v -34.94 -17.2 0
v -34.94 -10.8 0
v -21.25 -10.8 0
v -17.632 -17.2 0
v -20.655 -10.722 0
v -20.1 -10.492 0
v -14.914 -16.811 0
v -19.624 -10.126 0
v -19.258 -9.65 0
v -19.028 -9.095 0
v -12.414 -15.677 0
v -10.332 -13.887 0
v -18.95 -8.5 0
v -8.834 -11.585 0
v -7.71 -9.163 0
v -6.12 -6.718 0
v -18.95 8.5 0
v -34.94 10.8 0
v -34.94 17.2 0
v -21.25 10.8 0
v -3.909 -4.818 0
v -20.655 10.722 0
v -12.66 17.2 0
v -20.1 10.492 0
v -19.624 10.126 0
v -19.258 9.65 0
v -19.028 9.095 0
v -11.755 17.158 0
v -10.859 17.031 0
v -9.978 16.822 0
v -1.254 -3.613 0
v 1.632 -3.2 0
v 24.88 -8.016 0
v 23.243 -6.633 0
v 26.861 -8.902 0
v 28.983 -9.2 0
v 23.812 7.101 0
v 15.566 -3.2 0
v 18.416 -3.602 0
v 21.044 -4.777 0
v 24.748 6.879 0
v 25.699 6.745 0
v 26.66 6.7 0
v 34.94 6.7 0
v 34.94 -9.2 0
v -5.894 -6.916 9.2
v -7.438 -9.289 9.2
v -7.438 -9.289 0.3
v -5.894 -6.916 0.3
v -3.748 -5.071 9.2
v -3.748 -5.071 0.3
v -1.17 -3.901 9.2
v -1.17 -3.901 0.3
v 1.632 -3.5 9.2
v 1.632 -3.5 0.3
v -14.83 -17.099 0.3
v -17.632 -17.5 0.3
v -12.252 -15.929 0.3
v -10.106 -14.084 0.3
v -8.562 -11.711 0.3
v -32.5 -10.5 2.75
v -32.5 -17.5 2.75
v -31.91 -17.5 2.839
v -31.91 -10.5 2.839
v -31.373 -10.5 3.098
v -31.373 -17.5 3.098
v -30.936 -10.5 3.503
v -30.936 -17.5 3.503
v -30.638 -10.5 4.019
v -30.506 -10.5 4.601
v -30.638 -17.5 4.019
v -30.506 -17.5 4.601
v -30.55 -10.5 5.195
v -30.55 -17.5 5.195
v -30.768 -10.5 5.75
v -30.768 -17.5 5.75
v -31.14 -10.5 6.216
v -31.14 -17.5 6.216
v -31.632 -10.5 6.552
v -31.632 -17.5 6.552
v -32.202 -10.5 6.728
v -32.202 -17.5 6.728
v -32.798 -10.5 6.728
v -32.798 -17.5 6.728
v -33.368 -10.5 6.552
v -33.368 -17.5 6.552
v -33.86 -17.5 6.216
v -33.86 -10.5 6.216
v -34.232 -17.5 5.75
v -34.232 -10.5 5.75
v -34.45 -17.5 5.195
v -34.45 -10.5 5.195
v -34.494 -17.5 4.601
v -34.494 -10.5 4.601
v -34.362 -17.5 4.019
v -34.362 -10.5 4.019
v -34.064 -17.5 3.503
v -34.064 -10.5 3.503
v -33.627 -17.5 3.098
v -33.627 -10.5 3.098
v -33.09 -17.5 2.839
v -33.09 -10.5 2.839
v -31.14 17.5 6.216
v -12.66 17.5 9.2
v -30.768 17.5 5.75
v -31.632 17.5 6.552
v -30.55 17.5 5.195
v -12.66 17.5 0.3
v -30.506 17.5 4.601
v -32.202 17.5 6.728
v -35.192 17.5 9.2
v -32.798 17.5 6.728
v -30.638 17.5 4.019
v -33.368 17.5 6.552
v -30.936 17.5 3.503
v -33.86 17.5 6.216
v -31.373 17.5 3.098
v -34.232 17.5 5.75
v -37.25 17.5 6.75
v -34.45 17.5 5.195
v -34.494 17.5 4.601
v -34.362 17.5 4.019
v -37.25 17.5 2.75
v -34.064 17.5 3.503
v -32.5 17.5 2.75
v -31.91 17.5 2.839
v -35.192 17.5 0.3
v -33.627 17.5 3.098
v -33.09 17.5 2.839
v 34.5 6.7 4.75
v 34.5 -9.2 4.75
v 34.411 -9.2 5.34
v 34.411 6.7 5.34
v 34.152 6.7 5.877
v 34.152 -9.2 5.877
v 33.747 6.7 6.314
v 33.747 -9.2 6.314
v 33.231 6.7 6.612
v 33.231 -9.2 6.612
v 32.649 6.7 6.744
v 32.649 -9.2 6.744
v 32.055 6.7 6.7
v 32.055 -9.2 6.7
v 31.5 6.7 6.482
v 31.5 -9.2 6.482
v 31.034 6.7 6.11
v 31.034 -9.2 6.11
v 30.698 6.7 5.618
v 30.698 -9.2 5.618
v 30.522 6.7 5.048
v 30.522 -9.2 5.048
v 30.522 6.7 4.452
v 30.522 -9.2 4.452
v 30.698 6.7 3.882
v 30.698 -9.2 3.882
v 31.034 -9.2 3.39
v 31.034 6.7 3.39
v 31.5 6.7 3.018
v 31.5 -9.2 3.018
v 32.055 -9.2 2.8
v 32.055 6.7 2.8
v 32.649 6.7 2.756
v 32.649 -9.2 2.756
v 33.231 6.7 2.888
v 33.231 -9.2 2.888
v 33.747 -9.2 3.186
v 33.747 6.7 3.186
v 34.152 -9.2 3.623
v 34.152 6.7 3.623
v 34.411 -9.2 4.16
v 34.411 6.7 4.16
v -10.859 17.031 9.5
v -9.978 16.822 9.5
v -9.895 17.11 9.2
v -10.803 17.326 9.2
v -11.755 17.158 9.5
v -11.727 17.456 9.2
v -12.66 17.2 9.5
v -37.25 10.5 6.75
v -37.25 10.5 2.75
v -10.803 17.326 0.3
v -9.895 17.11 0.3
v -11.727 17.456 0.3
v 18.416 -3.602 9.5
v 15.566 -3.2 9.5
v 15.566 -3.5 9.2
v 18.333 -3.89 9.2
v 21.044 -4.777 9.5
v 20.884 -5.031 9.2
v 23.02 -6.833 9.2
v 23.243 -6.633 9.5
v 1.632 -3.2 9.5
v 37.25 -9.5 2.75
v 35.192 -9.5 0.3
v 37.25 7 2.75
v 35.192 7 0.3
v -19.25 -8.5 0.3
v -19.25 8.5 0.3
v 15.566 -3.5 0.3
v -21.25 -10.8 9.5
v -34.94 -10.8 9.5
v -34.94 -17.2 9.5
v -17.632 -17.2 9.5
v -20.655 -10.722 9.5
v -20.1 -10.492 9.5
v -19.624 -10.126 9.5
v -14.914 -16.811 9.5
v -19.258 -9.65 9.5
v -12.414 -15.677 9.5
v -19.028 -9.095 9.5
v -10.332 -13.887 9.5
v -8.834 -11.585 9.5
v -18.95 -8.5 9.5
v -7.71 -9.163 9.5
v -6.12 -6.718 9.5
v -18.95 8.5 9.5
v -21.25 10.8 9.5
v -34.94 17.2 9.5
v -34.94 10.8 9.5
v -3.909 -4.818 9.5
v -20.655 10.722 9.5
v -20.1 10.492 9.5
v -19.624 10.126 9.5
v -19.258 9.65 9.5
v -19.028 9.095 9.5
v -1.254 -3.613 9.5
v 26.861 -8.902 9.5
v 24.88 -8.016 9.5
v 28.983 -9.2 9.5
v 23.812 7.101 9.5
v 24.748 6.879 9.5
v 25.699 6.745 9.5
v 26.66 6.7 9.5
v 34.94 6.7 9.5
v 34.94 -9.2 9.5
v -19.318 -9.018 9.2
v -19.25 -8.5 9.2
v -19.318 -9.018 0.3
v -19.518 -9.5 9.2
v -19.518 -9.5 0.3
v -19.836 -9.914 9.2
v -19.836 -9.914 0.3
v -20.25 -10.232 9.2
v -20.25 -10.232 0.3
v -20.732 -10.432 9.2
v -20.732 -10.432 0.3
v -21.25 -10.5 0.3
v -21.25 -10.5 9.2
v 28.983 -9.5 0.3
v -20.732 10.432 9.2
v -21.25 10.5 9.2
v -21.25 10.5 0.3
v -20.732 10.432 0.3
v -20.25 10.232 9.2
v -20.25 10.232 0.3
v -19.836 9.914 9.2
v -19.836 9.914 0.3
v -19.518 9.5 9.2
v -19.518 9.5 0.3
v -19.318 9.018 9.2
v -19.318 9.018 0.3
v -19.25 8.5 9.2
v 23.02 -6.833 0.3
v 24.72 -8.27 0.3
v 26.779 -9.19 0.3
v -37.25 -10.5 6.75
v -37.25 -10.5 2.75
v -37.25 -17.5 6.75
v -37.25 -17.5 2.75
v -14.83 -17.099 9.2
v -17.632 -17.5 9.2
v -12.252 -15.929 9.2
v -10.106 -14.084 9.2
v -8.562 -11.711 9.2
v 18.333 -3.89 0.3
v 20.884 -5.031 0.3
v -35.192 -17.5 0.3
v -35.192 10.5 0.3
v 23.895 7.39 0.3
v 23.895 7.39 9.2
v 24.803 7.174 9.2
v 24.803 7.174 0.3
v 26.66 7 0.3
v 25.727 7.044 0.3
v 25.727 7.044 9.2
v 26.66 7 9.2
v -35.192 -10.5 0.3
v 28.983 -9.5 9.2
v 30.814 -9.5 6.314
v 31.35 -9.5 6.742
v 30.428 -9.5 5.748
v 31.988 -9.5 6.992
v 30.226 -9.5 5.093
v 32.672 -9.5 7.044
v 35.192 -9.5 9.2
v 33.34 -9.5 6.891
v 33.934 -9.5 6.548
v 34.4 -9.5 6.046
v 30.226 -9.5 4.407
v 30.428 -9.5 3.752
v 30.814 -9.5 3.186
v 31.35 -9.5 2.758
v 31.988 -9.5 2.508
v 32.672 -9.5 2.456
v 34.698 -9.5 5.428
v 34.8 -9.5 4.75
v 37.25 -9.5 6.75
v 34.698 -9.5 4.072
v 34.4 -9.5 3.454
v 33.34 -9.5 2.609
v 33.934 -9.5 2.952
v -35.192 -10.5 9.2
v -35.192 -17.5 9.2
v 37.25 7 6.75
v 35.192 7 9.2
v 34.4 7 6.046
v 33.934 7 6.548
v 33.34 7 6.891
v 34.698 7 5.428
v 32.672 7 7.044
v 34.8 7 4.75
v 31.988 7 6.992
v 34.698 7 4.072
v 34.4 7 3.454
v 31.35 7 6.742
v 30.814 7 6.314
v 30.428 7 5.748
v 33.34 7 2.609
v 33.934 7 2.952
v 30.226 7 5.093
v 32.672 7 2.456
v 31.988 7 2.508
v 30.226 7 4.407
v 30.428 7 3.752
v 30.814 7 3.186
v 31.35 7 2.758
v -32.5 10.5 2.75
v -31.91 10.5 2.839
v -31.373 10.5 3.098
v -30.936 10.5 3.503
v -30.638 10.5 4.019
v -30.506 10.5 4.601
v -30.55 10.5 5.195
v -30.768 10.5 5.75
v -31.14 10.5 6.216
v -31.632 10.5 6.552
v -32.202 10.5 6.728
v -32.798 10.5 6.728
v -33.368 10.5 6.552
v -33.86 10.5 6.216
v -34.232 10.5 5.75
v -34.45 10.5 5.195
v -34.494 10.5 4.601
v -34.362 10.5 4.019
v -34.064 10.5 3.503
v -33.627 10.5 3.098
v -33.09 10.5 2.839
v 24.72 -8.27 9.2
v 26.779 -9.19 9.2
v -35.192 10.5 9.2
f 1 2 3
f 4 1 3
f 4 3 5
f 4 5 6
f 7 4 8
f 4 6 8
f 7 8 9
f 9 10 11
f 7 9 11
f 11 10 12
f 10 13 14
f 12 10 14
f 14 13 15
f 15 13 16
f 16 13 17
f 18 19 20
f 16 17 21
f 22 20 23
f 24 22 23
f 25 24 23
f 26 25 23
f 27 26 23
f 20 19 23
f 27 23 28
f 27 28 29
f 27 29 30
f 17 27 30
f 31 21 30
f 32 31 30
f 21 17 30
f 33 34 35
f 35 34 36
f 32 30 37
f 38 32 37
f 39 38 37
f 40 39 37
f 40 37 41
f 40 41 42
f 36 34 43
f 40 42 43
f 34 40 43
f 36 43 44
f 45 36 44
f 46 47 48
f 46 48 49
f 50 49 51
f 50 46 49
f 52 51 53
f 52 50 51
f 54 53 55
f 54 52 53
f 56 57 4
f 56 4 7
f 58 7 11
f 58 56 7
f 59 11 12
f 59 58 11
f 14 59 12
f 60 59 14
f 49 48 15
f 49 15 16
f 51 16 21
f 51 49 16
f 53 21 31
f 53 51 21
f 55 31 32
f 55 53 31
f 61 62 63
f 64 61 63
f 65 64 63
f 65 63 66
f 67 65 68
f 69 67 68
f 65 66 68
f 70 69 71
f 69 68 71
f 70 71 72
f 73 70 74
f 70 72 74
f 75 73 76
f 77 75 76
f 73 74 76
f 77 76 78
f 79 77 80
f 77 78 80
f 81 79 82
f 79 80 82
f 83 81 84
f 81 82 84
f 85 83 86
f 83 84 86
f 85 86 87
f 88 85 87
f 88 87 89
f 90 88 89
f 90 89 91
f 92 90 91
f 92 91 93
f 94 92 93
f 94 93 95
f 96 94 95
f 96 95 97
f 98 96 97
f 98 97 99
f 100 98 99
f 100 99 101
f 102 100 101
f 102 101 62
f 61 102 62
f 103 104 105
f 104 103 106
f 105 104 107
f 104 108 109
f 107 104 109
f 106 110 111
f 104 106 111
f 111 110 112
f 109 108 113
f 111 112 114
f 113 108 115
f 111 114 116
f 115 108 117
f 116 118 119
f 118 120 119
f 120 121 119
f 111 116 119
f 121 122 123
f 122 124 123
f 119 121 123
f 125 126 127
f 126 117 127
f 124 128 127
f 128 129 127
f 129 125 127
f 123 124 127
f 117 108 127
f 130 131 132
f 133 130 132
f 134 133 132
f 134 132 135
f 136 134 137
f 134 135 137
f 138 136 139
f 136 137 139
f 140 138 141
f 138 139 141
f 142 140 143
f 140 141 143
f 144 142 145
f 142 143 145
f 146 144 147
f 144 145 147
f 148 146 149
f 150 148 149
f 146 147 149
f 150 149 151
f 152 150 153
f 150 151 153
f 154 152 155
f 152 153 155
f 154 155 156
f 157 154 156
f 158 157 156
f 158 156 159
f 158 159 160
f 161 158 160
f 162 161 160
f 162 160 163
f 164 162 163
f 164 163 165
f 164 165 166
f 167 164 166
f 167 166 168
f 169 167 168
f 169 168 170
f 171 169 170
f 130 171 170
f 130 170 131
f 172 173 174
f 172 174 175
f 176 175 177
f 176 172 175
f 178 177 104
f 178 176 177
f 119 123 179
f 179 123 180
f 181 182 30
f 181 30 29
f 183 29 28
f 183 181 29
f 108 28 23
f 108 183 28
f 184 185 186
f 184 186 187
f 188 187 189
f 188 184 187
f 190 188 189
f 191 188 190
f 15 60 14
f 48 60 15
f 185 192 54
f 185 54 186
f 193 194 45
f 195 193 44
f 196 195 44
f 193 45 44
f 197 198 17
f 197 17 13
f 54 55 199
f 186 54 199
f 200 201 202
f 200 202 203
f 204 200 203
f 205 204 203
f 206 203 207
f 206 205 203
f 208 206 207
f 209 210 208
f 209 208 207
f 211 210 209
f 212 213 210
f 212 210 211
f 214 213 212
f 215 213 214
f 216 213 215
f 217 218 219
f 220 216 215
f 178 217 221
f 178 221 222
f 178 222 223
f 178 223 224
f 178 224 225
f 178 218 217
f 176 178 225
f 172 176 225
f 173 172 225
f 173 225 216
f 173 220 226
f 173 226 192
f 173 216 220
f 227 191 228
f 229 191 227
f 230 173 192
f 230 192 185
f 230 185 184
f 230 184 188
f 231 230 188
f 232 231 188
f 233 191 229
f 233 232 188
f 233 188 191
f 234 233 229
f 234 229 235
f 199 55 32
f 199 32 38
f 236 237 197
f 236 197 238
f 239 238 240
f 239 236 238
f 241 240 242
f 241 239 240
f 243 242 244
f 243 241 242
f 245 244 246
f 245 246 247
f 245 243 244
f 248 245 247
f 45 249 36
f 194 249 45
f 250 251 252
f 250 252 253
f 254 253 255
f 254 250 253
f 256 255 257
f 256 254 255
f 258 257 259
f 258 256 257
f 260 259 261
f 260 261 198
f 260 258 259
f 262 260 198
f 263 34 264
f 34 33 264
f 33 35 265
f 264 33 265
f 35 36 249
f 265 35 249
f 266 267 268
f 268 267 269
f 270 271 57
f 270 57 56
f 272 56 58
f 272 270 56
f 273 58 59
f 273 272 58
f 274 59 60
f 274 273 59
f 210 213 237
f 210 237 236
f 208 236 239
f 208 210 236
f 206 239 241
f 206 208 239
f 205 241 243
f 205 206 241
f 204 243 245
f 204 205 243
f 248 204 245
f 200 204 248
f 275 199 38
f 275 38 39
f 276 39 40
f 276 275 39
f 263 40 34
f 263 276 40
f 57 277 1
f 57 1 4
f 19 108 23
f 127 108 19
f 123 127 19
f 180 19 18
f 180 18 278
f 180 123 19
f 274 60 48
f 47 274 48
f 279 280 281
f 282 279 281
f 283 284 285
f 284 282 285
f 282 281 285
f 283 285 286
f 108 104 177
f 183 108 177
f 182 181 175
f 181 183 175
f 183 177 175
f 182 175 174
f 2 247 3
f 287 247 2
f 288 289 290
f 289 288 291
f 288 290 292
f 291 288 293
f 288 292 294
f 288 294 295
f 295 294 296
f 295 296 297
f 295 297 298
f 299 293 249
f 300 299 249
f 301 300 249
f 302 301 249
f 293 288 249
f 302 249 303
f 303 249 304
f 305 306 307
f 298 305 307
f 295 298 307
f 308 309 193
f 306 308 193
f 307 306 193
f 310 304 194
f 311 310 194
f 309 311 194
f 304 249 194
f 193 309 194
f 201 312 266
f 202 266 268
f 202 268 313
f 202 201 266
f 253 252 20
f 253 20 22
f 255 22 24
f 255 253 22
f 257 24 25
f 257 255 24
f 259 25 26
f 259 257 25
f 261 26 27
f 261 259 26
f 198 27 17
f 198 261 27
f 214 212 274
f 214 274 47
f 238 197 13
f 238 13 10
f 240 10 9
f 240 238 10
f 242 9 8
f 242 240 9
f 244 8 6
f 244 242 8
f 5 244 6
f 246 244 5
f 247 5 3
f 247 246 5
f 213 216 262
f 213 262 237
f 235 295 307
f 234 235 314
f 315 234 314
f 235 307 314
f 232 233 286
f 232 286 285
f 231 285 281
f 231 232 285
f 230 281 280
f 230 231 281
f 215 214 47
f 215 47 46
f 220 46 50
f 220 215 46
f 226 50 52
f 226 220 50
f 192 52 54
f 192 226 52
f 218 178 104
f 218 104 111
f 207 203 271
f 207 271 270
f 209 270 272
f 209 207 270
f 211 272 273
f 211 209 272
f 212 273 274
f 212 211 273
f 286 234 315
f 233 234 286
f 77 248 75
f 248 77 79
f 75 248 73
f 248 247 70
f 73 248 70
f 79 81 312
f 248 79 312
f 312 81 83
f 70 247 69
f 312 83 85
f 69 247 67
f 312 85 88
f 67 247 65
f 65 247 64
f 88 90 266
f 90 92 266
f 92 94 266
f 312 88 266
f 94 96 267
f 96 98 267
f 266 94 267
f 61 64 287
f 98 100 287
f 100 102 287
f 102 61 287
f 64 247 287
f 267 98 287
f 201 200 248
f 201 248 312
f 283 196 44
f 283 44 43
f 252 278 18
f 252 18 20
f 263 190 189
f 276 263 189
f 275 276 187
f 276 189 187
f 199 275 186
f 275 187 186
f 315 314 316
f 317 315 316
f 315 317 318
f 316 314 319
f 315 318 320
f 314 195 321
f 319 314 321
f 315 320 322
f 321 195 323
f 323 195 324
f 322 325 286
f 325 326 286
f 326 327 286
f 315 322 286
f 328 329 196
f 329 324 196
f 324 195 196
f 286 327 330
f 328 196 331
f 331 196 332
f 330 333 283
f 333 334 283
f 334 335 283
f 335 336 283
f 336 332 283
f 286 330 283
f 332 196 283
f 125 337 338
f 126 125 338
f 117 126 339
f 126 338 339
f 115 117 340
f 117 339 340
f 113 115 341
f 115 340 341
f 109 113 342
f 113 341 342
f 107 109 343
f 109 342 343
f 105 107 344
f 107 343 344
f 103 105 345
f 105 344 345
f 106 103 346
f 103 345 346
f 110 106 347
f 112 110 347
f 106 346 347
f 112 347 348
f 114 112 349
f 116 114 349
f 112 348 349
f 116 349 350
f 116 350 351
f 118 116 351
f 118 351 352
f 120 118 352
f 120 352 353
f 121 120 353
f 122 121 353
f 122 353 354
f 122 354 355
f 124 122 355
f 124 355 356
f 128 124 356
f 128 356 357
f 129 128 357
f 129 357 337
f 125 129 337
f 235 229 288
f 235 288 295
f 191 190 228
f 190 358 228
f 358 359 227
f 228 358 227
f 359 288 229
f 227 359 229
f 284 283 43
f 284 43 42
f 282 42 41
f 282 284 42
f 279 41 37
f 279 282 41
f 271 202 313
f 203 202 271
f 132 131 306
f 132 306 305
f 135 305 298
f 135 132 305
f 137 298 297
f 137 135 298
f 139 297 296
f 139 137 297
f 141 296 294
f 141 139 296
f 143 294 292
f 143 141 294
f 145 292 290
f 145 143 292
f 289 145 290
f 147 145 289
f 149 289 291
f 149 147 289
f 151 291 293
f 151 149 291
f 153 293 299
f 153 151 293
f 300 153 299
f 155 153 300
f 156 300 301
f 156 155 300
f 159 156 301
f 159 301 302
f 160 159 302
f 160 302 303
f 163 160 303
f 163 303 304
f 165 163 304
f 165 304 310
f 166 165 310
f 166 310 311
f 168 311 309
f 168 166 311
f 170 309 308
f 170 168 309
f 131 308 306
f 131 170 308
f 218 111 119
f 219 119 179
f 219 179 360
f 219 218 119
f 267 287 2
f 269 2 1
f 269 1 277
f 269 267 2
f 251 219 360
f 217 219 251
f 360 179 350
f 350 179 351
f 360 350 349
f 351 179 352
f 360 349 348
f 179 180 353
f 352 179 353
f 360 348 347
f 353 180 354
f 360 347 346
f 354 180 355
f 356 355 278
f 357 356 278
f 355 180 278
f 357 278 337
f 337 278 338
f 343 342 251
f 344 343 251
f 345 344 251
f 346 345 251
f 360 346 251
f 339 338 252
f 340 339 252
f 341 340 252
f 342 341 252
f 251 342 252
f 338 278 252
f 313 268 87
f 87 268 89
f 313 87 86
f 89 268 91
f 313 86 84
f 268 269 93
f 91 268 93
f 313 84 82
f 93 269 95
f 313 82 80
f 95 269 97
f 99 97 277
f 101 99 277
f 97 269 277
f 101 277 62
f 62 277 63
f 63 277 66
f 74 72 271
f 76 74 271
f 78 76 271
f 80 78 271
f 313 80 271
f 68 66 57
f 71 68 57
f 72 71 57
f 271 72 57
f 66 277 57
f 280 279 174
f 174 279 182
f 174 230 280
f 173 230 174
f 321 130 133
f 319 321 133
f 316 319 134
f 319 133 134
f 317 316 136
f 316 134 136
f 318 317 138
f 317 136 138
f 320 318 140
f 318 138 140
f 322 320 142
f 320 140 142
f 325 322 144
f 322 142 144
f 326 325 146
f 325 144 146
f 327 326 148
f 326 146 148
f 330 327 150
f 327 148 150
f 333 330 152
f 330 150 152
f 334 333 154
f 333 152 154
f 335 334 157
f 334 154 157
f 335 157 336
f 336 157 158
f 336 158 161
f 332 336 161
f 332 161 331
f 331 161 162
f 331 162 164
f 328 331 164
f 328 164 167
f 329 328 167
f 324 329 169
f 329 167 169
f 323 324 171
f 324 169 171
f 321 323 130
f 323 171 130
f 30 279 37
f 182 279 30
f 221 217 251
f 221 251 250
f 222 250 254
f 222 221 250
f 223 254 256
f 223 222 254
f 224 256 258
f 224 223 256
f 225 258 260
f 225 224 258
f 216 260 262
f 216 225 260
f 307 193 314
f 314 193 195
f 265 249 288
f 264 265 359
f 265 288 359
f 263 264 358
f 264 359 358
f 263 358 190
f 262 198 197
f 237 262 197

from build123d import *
from OCP.BRepFilletAPI import BRepFilletAPI_MakeChamfer

# Parameters (mm, degrees)
BOSS_EXTRUDE1_DEPTH = 9.5
SKETCH2_R           = 2
CUT_EXTRUDE1_DEPTH  = 44
CHAMFER3_SIZE       = 2.31
CHAMFER3_SIZE2      = 2.75
CHAMFER4_SIZE       = 2.75
CHAMFER4_SIZE2      = 2.31
FILLET2_R           = 2
FILLET3_R           = 10
FILLET4_R           = 8
CHAMFER5_SIZE       = 0.3


with BuildPart() as part:
    # Sketch1 → Boss-Extrude1 (new body)
    with BuildSketch(Plane.XY):
        Polygon((25.25, -9.5), (37.25, -9.5), (37.25, 7), (25.25, 7), (-11.25, 17.5), (-37.25, 17.5), (-37.25, 10.5), (-19.25, 10.5), (-19.25, -10.5), (-37.25, -10.5), (-37.25, -17.5), (-11.25, -17.5), (-4.75, -3.5), (20.25, -3.5), align=None)
    extrude(amount=BOSS_EXTRUDE1_DEPTH)

    # Sketch2 → Cut-Extrude1 (cut)
    with BuildSketch(Plane.XZ.offset(17.5)):
        with Locations((-32.5, 4.75)):
            Circle(SKETCH2_R)
        with Locations((32.5, 4.75)):
            Circle(SKETCH2_R)
    extrude(amount=-CUT_EXTRUDE1_DEPTH, mode=Mode.SUBTRACT)

    # Chamfer3: one chamfer whose edges measure the first distance from different faces: ONE call of the kernel's chamfer builder (chamfer() names one face for all edges)
    chamfer3_edges_1 = [part.edges().sort_by_distance(p)[0] for p in [
        (-37.25, 14, 0),
        (-37.25, -14, 0),
    ]]
    chamfer3_side_1 = [part.faces().sort_by_distance(p)[0] for p in [
        (-1.759689035, 1.451005524, 0),
    ]]
    chamfer3_edges_2 = [part.edges().sort_by_distance(p)[0] for p in [
        (37.25, -1.25, 9.5),
    ]]
    chamfer3_side_2 = [part.faces().sort_by_distance(p)[0] for p in [
        (-1.759689035, 1.451005524, 9.5),
    ]]
    chamfer3 = BRepFilletAPI_MakeChamfer(part.part.solid().wrapped)
    for e in chamfer3_edges_1:
        chamfer3.Add(CHAMFER3_SIZE, CHAMFER3_SIZE2, e.wrapped, chamfer3_side_1[0].wrapped)  # the first distance lies on this face
    for e in chamfer3_edges_2:
        chamfer3.Add(CHAMFER3_SIZE, CHAMFER3_SIZE2, e.wrapped, chamfer3_side_2[0].wrapped)  # the first distance lies on this face
    add(Compound.cast(chamfer3.Shape()), mode=Mode.REPLACE)

    # Chamfer4: one chamfer whose edges measure the first distance from different faces: ONE call of the kernel's chamfer builder (chamfer() names one face for all edges)
    chamfer4_edges_1 = [part.edges().sort_by_distance(p)[0] for p in [
        (37.25, -1.25, 0),
    ]]
    chamfer4_side_1 = [part.faces().sort_by_distance(p)[0] for p in [
        (37.25, -1.25, 3.375),
    ]]
    chamfer4_edges_2 = [part.edges().sort_by_distance(p)[0] for p in [
        (-37.25, -14, 9.5),
    ]]
    chamfer4_side_2 = [part.faces().sort_by_distance(p)[0] for p in [
        (-37.25, -14, 6.125),
    ]]
    chamfer4_edges_3 = [part.edges().sort_by_distance(p)[0] for p in [
        (-37.25, 14, 9.5),
    ]]
    chamfer4_side_3 = [part.faces().sort_by_distance(p)[0] for p in [
        (-37.25, 14, 6.125),
    ]]
    chamfer4 = BRepFilletAPI_MakeChamfer(part.part.solid().wrapped)
    for e in chamfer4_edges_1:
        chamfer4.Add(CHAMFER4_SIZE, CHAMFER4_SIZE2, e.wrapped, chamfer4_side_1[0].wrapped)  # the first distance lies on this face
    for e in chamfer4_edges_2:
        chamfer4.Add(CHAMFER4_SIZE, CHAMFER4_SIZE2, e.wrapped, chamfer4_side_2[0].wrapped)  # the first distance lies on this face
    for e in chamfer4_edges_3:
        chamfer4.Add(CHAMFER4_SIZE, CHAMFER4_SIZE2, e.wrapped, chamfer4_side_3[0].wrapped)  # the first distance lies on this face
    add(Compound.cast(chamfer4.Shape()), mode=Mode.REPLACE)

    # Fillet2
    fillet2_edges = [part.edges().sort_by_distance(p)[0] for p in [
        (-19.25, -10.5, 4.75),
        (-19.25, 10.5, 4.75),
    ]]
    fillet(fillet2_edges, radius=FILLET2_R)

    # Fillet3
    fillet3_edges = [part.edges().sort_by_distance(p)[0] for p in [
        (-11.25, -17.5, 4.75),
        (-4.75, -3.5, 4.75),
        (20.25, -3.5, 4.75),
        (25.25, 7, 4.75),
        (-11.25, 17.5, 4.75),
    ]]
    fillet(fillet3_edges, radius=FILLET3_R)

    # Fillet4
    fillet4_edges = [part.edges().sort_by_distance(p)[0] for p in [
        (25.25, -9.5, 4.75),
    ]]
    fillet(fillet4_edges, radius=FILLET4_R)

    # Chamfer5
    chamfer5_edges = [part.edges().sort_by_distance(p)[0] for p in [
        (30.5, 7, 4.75),
        (30.5, -9.5, 4.75),
        (-28.095, 10.5, 0),
        (-28.095, -10.5, 0),
        (-19.835786438, 9.914213562, 0),
        (-19.835786438, -9.914213562, 0),
        (-19.25, 0, 0),
        (-28.095, 10.5, 9.5),
        (-28.095, -10.5, 9.5),
        (-19.835786438, 9.914213562, 9.5),
        (-19.835786438, -9.914213562, 9.5),
        (-19.25, 0, 9.5),
        (-23.799884776, 17.5, 0),
        (30.799884776, 7, 0),
        (-11.263803813, 17.402084612, 0),
        (25.263803813, 7.097915388, 0),
        (7, 12.25, 0),
        (-23.799884776, 17.5, 9.5),
        (30.799884776, 7, 9.5),
        (-11.263803813, 17.402084612, 9.5),
        (25.263803813, 7.097915388, 9.5),
        (7, 12.25, 9.5),
        (-26.286196086, -17.5, 0),
        (31.961329203, -9.5, 0),
        (-12.252388949, -15.929446324, 0),
        (25.716672081, -8.802967433, 0),
        (-8, -10.5, 0),
        (19.648733445, -4.371290708, 0),
        (-3.747611051, -5.070553676, 0),
        (8.599321356, -3.5, 0),
        (-26.286196086, -17.5, 9.5),
        (31.961329203, -9.5, 9.5),
        (-12.252388949, -15.929446324, 9.5),
        (25.716672081, -8.802967433, 9.5),
        (-8, -10.5, 9.5),
        (19.648733445, -4.371290708, 9.5),
        (-3.747611051, -5.070553676, 9.5),
        (8.599321356, -3.5, 9.5),
    ]]
    chamfer(chamfer5_edges, length=CHAMFER5_SIZE)


solid = part.part
